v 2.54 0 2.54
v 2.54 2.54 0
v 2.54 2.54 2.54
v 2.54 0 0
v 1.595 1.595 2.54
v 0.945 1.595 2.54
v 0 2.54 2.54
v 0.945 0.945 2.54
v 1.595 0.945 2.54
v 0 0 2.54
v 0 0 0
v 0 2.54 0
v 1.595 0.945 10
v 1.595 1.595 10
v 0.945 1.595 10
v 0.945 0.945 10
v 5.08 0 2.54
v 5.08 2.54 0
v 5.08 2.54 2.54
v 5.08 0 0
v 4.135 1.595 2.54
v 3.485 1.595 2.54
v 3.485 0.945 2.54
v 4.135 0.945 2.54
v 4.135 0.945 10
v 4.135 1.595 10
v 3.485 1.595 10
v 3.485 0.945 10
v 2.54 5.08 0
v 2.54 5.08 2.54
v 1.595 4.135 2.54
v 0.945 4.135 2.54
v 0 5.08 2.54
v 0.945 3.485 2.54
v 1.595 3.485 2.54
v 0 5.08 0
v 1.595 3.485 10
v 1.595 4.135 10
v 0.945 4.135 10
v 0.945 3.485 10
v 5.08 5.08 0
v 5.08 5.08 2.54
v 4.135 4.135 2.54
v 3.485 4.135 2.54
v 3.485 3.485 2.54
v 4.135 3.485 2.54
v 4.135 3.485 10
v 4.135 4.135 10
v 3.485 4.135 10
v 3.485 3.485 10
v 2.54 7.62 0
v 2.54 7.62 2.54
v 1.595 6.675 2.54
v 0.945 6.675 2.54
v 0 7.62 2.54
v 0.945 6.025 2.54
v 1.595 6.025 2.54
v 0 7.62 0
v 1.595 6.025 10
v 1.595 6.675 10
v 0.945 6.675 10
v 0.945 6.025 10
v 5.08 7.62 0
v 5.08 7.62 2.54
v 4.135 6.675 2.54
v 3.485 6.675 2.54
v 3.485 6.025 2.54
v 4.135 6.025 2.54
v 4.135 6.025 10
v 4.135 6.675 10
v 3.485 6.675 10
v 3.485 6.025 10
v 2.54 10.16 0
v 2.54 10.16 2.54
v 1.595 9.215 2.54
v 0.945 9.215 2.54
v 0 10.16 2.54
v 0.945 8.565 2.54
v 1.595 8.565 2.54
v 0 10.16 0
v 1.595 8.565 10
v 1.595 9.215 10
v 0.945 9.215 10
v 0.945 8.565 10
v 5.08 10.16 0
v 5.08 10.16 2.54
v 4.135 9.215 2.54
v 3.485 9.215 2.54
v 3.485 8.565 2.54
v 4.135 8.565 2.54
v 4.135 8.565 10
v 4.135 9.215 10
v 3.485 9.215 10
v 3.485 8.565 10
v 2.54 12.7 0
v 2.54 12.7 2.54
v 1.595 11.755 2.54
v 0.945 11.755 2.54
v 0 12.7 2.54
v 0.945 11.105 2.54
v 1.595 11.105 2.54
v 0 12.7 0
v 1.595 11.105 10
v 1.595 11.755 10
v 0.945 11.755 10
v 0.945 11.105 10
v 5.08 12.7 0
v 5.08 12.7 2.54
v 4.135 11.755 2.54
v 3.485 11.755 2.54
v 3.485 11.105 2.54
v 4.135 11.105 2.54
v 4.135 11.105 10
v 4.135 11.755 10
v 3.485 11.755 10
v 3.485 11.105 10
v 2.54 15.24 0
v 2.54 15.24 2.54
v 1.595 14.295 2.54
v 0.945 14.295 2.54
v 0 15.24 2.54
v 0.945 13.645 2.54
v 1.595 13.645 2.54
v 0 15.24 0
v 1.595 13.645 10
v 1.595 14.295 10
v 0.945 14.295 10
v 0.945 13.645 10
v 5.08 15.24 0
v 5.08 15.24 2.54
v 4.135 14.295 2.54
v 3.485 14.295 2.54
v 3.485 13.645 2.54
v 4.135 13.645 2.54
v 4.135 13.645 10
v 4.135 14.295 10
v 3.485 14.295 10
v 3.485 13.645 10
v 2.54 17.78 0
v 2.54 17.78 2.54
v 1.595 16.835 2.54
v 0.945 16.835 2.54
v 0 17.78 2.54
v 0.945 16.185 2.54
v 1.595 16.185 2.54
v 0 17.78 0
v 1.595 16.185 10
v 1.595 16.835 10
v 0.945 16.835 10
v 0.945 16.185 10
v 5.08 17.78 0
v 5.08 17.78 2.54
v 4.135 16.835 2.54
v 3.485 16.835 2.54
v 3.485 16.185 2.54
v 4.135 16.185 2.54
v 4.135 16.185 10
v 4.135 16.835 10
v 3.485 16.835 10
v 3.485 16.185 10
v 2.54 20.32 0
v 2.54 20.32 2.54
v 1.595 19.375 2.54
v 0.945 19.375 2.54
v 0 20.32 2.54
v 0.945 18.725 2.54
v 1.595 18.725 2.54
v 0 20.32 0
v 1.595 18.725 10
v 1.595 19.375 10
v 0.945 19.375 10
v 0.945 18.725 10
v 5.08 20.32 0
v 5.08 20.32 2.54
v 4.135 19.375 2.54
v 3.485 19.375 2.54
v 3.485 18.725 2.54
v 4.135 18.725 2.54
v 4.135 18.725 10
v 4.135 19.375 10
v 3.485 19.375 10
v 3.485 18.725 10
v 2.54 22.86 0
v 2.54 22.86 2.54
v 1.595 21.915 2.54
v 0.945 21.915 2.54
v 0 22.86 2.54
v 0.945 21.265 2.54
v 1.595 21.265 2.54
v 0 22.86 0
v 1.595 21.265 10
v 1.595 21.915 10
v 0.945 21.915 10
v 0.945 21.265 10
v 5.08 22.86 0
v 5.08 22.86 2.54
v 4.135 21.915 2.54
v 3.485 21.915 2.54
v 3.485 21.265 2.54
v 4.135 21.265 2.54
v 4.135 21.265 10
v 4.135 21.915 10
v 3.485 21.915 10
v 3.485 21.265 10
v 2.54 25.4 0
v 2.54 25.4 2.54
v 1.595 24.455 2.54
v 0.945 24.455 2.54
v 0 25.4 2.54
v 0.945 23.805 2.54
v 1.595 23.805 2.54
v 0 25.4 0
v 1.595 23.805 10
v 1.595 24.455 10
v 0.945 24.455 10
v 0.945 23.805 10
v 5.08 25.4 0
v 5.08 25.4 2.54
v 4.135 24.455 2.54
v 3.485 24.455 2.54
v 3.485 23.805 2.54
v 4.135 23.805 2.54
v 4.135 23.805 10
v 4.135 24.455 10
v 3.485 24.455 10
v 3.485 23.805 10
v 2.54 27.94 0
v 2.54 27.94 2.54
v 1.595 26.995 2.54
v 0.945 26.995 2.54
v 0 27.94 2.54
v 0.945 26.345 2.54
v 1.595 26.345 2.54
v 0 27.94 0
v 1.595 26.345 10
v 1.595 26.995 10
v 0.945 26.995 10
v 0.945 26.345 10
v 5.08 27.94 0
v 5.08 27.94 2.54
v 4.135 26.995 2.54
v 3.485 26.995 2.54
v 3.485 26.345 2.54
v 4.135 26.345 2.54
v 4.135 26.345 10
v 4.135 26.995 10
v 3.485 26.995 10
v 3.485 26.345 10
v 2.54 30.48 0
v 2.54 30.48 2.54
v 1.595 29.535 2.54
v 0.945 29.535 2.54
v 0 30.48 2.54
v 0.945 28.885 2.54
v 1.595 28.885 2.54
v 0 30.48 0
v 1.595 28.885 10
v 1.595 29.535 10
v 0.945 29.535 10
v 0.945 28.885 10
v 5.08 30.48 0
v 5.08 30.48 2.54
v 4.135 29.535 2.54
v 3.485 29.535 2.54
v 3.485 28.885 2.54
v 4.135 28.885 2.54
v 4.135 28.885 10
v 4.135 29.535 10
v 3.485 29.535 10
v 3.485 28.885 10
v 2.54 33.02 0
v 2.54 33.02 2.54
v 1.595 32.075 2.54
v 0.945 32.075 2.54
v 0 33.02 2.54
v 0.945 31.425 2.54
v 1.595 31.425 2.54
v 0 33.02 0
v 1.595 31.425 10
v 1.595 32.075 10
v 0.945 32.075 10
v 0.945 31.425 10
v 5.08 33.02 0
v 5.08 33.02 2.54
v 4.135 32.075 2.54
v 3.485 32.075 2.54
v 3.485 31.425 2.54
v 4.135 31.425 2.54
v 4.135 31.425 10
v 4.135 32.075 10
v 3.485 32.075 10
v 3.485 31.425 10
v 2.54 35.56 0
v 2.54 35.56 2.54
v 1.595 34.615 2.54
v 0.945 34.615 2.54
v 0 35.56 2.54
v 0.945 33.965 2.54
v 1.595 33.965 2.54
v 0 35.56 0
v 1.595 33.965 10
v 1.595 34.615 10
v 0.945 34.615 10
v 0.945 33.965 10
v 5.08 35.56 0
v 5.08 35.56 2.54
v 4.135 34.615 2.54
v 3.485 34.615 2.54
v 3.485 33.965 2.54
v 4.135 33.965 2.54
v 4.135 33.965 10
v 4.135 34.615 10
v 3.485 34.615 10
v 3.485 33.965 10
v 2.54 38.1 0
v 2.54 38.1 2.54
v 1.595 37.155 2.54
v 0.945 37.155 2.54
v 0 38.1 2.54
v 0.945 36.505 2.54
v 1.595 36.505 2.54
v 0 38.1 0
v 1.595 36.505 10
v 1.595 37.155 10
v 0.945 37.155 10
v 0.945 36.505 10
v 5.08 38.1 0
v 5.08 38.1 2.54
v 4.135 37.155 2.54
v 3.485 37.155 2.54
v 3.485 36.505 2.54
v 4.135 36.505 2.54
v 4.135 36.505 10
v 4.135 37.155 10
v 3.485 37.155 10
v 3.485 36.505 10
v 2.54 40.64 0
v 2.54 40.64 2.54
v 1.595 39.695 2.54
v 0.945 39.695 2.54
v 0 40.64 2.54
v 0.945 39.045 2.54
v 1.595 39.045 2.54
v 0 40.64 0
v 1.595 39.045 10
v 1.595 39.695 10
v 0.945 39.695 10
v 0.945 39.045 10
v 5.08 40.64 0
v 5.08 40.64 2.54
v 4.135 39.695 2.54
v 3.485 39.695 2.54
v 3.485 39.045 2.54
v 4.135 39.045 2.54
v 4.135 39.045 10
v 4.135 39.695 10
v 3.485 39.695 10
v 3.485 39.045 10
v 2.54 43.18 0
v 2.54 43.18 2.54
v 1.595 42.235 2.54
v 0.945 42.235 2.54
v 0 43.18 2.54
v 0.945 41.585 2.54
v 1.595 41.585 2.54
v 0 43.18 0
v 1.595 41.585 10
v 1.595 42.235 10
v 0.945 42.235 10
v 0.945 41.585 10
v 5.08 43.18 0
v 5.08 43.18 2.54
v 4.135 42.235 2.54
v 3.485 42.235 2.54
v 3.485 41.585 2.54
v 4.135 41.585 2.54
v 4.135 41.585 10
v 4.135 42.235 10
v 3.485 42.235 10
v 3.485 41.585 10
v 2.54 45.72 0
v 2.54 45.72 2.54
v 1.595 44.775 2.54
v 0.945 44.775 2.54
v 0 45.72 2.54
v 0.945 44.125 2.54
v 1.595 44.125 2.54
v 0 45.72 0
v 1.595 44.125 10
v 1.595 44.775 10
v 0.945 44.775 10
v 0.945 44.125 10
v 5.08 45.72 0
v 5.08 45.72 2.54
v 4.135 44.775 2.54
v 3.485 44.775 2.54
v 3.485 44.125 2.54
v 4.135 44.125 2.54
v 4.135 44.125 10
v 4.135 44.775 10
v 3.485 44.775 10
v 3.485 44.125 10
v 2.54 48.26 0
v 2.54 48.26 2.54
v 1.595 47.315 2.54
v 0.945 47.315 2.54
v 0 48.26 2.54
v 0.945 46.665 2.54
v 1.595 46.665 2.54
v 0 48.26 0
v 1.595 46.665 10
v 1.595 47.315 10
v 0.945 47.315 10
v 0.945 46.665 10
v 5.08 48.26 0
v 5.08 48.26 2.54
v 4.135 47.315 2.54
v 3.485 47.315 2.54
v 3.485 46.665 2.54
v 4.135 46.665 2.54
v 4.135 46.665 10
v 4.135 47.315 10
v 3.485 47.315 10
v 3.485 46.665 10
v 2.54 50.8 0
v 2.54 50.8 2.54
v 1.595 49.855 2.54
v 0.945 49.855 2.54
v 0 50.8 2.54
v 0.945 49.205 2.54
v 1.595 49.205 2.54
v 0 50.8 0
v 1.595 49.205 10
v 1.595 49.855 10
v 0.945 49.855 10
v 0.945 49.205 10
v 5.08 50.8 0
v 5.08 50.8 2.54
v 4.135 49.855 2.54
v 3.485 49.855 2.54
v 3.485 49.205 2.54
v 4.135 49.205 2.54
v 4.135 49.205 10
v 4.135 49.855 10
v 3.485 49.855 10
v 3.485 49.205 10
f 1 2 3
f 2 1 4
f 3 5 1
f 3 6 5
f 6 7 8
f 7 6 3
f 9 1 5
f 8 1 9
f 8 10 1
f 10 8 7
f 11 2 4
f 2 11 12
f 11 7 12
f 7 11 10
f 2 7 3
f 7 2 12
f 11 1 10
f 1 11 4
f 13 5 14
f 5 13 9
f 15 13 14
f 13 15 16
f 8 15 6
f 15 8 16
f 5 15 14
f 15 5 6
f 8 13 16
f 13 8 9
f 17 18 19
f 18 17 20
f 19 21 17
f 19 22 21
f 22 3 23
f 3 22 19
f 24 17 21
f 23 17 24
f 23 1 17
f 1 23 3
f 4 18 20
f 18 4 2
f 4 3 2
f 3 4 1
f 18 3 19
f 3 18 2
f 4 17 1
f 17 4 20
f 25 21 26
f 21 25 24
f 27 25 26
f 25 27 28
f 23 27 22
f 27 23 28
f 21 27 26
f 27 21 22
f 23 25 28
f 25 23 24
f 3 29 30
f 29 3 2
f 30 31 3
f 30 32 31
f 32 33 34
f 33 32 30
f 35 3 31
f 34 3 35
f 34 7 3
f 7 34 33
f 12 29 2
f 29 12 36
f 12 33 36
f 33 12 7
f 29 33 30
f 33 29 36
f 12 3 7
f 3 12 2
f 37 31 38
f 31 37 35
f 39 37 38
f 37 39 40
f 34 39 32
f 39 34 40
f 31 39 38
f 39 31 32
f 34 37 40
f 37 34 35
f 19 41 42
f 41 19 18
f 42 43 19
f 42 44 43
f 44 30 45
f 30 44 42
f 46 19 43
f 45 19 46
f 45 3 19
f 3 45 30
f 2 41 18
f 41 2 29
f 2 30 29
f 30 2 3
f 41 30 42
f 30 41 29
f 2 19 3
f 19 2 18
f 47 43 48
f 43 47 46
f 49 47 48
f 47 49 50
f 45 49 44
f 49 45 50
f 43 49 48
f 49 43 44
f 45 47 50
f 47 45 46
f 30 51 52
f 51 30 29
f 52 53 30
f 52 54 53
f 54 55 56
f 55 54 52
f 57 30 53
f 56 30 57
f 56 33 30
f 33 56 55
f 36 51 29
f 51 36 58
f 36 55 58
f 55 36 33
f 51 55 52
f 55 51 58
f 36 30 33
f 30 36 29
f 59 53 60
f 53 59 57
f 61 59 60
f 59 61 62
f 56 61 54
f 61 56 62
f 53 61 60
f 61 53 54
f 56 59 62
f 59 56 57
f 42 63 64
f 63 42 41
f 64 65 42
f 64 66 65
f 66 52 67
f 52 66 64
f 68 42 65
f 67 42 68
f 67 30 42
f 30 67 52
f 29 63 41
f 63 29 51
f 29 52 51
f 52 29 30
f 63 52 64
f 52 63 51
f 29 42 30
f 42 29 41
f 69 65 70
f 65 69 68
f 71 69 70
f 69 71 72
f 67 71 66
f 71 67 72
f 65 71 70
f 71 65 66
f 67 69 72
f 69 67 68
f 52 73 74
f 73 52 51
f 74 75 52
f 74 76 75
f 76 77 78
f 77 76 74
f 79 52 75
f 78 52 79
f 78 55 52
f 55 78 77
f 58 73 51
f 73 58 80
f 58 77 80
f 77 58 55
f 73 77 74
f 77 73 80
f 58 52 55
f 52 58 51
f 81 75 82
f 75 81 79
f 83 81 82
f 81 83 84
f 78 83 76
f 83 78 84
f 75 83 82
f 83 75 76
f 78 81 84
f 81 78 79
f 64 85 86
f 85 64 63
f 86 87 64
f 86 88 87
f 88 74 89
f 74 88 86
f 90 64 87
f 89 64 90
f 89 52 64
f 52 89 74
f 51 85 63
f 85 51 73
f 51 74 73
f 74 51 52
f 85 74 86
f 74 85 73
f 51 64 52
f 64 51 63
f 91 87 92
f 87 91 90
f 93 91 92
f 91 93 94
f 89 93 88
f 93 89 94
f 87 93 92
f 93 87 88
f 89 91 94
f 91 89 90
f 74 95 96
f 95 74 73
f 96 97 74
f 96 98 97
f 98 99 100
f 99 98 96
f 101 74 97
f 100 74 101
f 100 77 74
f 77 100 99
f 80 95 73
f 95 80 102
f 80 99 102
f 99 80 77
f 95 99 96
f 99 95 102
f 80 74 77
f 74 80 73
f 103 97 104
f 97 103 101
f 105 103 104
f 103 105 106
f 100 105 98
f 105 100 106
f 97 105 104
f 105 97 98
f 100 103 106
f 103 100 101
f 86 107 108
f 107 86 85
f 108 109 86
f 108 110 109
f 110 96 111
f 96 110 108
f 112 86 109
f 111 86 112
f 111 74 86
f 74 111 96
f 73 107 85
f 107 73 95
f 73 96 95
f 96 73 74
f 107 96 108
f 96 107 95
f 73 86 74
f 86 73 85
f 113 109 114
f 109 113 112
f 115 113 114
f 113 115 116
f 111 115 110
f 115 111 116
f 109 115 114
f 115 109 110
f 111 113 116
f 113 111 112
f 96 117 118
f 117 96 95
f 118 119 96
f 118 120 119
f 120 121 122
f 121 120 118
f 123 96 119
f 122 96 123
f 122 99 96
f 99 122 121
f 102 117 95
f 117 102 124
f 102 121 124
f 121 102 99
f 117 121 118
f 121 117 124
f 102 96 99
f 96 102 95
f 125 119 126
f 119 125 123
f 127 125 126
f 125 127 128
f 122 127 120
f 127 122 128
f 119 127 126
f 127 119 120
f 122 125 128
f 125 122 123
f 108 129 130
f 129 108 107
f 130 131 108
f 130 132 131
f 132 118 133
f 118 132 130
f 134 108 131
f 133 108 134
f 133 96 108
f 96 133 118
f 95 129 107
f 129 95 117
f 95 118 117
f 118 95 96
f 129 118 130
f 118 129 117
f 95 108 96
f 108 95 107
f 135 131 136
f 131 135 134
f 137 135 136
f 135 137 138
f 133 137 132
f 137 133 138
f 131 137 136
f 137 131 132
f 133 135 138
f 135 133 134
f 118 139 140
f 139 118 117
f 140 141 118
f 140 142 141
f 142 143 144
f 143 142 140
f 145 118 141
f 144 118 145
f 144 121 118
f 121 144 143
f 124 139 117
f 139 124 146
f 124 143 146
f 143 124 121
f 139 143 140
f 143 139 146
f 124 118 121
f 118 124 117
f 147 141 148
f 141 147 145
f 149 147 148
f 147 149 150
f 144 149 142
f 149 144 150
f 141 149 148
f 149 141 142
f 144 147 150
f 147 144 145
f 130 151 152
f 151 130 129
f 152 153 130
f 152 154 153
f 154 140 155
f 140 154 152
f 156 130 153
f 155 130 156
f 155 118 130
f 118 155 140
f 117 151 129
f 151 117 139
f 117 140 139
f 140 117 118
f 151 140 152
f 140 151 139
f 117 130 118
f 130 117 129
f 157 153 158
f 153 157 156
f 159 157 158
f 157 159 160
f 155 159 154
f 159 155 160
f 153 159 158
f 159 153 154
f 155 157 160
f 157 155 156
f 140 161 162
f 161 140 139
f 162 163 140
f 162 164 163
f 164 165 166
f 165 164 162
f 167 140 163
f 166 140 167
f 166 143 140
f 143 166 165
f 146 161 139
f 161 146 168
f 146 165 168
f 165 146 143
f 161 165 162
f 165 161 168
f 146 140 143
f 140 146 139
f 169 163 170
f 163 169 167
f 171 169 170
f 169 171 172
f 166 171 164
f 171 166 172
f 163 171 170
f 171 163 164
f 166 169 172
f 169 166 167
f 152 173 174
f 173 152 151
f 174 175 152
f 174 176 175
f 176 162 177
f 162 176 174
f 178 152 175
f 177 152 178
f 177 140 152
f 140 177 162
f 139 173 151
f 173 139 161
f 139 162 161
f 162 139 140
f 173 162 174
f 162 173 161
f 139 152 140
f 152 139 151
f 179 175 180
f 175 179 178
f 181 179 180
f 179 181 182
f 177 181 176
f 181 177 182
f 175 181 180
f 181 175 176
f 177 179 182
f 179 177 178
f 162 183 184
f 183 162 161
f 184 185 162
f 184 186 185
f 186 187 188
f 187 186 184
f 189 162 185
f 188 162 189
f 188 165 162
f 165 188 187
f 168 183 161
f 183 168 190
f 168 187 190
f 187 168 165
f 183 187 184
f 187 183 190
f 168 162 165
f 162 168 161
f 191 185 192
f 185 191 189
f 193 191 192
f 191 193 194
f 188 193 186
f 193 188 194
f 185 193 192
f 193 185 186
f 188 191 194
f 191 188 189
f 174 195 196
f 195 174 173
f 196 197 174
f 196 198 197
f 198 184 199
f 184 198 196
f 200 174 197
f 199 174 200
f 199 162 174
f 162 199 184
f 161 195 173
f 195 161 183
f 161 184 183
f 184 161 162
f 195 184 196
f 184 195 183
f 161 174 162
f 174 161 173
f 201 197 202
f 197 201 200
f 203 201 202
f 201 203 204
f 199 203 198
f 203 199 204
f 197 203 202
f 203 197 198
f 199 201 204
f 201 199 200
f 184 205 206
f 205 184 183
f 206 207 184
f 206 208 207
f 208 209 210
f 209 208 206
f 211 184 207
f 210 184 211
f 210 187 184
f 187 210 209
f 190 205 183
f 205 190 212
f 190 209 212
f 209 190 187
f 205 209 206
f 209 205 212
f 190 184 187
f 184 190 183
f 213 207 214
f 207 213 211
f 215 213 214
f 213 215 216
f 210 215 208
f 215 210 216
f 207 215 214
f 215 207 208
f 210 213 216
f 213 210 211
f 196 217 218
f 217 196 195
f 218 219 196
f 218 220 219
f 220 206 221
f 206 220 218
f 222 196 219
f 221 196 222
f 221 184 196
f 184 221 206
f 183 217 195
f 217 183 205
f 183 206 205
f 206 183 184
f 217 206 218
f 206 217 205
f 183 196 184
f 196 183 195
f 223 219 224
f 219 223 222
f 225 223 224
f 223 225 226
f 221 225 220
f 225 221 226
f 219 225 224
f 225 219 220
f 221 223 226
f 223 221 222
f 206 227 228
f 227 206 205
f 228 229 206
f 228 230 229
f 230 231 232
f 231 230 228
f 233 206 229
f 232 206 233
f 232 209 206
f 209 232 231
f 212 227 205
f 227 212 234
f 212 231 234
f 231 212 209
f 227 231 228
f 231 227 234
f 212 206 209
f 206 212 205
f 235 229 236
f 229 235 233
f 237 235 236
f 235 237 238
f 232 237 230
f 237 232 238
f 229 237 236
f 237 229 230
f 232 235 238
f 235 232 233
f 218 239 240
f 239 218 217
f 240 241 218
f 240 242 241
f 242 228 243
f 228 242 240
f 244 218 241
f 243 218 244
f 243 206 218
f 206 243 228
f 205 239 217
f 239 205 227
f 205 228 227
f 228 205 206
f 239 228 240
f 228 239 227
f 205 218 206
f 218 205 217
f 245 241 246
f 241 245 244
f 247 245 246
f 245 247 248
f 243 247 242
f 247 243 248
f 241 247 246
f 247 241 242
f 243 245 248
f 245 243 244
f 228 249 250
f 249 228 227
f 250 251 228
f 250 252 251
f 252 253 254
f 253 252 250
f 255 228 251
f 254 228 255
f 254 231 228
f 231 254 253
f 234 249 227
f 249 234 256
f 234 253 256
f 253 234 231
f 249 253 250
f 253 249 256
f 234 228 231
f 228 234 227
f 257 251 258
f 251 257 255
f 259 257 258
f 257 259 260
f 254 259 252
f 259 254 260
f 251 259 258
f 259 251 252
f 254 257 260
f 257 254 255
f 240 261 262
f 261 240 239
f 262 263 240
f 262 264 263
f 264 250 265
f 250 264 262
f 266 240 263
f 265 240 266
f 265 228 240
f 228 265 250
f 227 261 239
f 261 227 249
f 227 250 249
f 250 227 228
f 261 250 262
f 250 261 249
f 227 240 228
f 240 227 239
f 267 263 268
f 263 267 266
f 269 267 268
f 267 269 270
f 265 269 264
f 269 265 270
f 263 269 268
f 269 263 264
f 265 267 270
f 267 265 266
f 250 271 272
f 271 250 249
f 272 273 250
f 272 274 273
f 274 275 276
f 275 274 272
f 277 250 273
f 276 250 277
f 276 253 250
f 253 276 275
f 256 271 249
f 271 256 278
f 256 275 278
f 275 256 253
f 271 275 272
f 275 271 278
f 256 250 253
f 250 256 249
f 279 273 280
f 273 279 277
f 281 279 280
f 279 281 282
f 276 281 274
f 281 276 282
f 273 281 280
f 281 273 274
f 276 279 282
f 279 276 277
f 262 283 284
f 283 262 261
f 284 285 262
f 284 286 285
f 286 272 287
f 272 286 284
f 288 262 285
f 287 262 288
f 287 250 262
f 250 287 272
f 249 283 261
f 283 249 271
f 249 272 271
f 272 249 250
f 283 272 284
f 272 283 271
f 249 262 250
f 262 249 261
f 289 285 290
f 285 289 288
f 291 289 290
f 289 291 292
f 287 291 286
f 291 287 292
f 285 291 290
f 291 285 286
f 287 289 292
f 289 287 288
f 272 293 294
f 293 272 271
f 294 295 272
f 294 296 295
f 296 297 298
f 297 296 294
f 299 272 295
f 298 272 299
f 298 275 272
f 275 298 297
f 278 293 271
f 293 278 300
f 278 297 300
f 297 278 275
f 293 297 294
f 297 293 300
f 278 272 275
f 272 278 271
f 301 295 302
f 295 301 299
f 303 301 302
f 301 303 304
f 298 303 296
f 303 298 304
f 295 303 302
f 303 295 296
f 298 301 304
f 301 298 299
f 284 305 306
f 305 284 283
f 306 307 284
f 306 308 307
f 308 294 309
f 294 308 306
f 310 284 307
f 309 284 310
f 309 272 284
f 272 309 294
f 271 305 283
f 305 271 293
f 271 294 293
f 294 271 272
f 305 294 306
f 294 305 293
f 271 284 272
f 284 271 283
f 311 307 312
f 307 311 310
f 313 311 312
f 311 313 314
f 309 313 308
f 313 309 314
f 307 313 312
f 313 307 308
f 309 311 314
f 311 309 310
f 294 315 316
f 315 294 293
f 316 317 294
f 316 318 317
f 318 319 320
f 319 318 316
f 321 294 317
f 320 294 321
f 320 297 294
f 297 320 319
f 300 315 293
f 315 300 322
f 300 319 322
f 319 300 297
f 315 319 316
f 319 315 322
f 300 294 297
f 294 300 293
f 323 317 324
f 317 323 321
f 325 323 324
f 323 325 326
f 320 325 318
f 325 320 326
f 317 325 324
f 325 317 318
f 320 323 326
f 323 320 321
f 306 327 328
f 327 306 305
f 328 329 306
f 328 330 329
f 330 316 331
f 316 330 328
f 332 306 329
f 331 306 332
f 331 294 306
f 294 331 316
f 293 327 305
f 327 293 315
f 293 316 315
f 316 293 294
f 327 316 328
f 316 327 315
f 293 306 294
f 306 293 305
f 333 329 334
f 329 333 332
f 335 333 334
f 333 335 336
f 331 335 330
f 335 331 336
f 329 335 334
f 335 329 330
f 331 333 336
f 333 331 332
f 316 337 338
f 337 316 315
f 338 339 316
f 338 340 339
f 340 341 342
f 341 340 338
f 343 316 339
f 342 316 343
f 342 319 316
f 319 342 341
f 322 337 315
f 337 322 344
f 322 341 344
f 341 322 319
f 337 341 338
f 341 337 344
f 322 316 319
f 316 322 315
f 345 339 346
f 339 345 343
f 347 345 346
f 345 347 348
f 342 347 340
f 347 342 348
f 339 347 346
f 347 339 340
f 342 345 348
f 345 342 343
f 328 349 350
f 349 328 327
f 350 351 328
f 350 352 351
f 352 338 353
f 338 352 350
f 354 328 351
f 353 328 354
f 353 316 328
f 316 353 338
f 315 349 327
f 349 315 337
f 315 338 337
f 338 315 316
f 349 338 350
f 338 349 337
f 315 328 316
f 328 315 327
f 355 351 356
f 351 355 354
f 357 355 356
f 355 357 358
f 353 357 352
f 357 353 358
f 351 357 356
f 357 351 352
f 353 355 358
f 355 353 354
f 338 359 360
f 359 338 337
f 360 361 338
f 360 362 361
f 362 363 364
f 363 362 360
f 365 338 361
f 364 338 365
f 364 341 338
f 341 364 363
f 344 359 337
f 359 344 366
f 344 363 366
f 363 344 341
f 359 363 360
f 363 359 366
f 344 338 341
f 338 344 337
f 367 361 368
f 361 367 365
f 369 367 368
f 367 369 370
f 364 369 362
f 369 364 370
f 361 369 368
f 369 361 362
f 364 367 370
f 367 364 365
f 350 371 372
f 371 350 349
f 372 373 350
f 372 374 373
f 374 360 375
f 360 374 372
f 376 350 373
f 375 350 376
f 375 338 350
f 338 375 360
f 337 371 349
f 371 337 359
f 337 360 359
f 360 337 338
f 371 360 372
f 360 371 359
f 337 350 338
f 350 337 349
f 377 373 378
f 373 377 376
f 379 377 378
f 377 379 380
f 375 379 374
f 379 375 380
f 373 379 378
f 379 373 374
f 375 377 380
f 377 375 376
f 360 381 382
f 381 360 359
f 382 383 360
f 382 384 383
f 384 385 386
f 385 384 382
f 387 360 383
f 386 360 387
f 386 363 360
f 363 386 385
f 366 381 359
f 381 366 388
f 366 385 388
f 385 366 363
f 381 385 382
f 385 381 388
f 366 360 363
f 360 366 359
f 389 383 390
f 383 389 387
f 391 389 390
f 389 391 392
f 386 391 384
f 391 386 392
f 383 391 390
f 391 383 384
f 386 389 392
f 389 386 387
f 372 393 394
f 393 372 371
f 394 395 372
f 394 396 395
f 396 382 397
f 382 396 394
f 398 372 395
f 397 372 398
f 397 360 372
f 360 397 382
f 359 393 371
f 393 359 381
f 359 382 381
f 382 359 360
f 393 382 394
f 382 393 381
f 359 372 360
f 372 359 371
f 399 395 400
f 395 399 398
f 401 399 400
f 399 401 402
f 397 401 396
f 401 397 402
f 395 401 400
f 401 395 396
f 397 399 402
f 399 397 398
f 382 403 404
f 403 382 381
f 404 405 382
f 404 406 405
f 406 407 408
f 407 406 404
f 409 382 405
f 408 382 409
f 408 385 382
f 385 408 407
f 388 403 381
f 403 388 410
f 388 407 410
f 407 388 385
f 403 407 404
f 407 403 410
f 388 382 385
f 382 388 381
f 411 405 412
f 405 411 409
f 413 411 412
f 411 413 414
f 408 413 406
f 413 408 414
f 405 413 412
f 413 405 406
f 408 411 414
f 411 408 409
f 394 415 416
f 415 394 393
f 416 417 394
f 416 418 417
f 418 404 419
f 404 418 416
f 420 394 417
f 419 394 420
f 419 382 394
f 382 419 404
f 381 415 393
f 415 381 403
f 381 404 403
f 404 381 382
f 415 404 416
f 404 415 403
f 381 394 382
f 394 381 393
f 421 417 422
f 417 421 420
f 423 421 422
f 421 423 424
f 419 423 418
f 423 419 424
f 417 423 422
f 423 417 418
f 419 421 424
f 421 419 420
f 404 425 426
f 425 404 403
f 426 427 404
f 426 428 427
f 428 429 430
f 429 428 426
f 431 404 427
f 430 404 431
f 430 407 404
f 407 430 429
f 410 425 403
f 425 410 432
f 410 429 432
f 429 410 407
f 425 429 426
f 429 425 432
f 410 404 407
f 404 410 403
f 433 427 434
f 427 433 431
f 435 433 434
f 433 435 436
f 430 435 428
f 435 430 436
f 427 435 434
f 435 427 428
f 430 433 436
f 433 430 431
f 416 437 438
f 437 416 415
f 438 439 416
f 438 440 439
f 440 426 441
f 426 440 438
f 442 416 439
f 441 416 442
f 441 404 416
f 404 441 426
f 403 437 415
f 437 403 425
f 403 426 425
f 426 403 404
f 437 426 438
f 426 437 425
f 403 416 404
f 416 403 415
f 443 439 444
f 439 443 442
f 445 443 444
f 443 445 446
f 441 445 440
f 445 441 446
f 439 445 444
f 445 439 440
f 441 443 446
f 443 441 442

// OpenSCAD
/**
 * Module: Pin header connector
 *
 * Author: Karim Aziiev <karim.aziiev@gmail.com>
 * License: GPL-3.0-or-later
 */

include <../colors.scad>
include <../parameters.scad>

use <../lib/plist.scad>

function pin_header_size(header_width,
                         header_y_width,
                         cols,
                         rows) =
  let (total_x = header_width * rows,
       total_y = (is_undef(header_y_width)
                  ? header_width
                  : header_y_width) * cols)
  [total_x, total_y];

function pin_header_size_from_plist(plist) =
  pin_header_size(header_width=plist_get("header_width", plist, undef),
                  header_y_width=plist_get("header_y_width", plist, undef),
                  cols=plist_get("cols", plist, undef),
                  rows=plist_get("rows", plist, undef));

module pin_header_item(base_size,
                       pin_colr=metallic_yellow_1,
                       base_colr=matte_black,
                       pin_size,
                       z_offset=0,
                       l_len) {
  header_x = base_size[0];
  header_y = base_size[1];

  pin_x = pin_size[0];
  pin_y = pin_size[1];
  pin_height = pin_size[2];

  union() {
    color(base_colr) {
      cube(base_size);
    }
    color(pin_colr) {
      translate([(header_x - pin_x) / 2,
                 (header_y - pin_y) / 2,
                 -z_offset]) {
        cube([pin_x, pin_y, pin_height]);

        if (!is_undef(l_len)) {
          translate([-l_len + pin_x, 0, pin_height]) {
            cube([l_len, pin_x, pin_y]);
          }
        }
      }
    }
    children();
  }
}

module pin_header(cols,
                  rows,
                  pin_colr=metallic_yellow_1,
                  base_colr=matte_black,
                  header_width,
                  header_height,
                  header_y_width,
                  pin_height,
                  l_len,
                  p,
                  z_offset=0,
                  center=false) {

  header_y_width = is_undef(header_y_width) ? header_width : header_y_width ;
  size = pin_header_size(header_width=header_width,
                         header_y_width=header_y_width,
                         cols=cols,
                         rows=rows);
  total_x = size[0];
  total_y = size[1];

  translate([center ? -total_x / 2 : 0, center ? - total_y / 2 : 0, 0]) {

    for (y = [0 : (cols -1)]) {
      for (x = [0 : (rows  - 1)]) {
        translate([header_width * x, header_y_width * y, 0]) {
          union() {
            pin_header_item(base_size=[header_width, header_y_width, header_height],
                            pin_size=[p, p, pin_height],
                            z_offset=z_offset,
                            pin_colr=pin_colr,
                            l_len=l_len,
                            base_colr=base_colr) {
              $y = y;
              $x = x;
              children();
            }
          }
        }
      }
    }
  }
}

module pin_header_from_plist(plist, center=false) {
  assert(plist_is(plist) && len(plist) > 0, "Supply a hardware specification");
  cols = plist_get("cols", plist, undef);
  rows = plist_get("rows", plist, undef);
  pin_colr = plist_get("pin_colr", plist, metallic_yellow_1);
  base_colr = plist_get("base_colr", plist, matte_black);
  header_width = plist_get("header_width", plist, undef);
  header_height = plist_get("header_height", plist, undef);
  header_y_width = plist_get("header_y_width", plist, undef);
  pin_height = plist_get("pin_height", plist, undef);
  l_len = plist_get("l_len", plist, undef);
  p = plist_get("p", plist, undef);
  z_offset = plist_get("z_offset", plist, 0);

  pin_header(cols=cols,
             rows=rows,
             pin_colr=pin_colr,
             base_colr=base_colr,
             header_width=header_width,
             header_height=header_height,
             header_y_width=header_y_width,
             pin_height=pin_height,
             l_len=l_len,
             p=p,
             z_offset=z_offset,
             center=center);
}

rotate([0, 0, 0]) {
  pin_h = 10;
  header_height = 2.54;
  pin_header(cols=20,
             rows=2,
             header_width=rpi_pin_header_width,
             header_height=header_height,
             pin_height=pin_h,
             z_offset=0.0,
             center=false,
             p=0.65);
}
